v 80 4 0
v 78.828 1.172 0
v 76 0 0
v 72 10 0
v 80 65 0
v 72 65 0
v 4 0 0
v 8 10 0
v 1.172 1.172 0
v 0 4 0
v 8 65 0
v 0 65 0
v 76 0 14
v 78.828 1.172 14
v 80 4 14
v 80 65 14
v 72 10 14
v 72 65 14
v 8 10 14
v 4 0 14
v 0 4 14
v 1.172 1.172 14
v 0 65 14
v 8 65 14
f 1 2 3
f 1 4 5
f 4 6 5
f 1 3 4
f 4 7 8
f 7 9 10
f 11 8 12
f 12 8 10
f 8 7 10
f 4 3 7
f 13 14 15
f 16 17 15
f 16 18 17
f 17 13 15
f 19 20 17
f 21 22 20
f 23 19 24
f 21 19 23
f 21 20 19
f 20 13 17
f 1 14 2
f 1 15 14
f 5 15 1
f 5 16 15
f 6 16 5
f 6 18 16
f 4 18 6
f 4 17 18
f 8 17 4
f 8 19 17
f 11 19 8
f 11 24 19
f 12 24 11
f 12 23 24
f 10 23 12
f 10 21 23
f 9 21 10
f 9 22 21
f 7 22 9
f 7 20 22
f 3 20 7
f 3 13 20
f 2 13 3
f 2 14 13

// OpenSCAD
$fn = 32;

// ----------------------------------------------------------------------
// Heat sink frame: 80 x 65 mm frame, 8 mm walls
// ----------------------------------------------------------------------

// --- parameters (mm) ---
profile_height = 14;      // extrusion height
profile_points = 12;      // points of the closed outline

profile = [[0, 4], [1.172, 1.172], [4, 0], [76, 0], [78.828, 1.172], [80, 4], [80, 65], [72, 65], [72, 10], [8, 10], [8, 65], [0, 65]];  // single closed polygon, 12 points, counter clockwise

// --- the one profile operation ---
linear_extrude(height = profile_height) polygon(points = profile);
